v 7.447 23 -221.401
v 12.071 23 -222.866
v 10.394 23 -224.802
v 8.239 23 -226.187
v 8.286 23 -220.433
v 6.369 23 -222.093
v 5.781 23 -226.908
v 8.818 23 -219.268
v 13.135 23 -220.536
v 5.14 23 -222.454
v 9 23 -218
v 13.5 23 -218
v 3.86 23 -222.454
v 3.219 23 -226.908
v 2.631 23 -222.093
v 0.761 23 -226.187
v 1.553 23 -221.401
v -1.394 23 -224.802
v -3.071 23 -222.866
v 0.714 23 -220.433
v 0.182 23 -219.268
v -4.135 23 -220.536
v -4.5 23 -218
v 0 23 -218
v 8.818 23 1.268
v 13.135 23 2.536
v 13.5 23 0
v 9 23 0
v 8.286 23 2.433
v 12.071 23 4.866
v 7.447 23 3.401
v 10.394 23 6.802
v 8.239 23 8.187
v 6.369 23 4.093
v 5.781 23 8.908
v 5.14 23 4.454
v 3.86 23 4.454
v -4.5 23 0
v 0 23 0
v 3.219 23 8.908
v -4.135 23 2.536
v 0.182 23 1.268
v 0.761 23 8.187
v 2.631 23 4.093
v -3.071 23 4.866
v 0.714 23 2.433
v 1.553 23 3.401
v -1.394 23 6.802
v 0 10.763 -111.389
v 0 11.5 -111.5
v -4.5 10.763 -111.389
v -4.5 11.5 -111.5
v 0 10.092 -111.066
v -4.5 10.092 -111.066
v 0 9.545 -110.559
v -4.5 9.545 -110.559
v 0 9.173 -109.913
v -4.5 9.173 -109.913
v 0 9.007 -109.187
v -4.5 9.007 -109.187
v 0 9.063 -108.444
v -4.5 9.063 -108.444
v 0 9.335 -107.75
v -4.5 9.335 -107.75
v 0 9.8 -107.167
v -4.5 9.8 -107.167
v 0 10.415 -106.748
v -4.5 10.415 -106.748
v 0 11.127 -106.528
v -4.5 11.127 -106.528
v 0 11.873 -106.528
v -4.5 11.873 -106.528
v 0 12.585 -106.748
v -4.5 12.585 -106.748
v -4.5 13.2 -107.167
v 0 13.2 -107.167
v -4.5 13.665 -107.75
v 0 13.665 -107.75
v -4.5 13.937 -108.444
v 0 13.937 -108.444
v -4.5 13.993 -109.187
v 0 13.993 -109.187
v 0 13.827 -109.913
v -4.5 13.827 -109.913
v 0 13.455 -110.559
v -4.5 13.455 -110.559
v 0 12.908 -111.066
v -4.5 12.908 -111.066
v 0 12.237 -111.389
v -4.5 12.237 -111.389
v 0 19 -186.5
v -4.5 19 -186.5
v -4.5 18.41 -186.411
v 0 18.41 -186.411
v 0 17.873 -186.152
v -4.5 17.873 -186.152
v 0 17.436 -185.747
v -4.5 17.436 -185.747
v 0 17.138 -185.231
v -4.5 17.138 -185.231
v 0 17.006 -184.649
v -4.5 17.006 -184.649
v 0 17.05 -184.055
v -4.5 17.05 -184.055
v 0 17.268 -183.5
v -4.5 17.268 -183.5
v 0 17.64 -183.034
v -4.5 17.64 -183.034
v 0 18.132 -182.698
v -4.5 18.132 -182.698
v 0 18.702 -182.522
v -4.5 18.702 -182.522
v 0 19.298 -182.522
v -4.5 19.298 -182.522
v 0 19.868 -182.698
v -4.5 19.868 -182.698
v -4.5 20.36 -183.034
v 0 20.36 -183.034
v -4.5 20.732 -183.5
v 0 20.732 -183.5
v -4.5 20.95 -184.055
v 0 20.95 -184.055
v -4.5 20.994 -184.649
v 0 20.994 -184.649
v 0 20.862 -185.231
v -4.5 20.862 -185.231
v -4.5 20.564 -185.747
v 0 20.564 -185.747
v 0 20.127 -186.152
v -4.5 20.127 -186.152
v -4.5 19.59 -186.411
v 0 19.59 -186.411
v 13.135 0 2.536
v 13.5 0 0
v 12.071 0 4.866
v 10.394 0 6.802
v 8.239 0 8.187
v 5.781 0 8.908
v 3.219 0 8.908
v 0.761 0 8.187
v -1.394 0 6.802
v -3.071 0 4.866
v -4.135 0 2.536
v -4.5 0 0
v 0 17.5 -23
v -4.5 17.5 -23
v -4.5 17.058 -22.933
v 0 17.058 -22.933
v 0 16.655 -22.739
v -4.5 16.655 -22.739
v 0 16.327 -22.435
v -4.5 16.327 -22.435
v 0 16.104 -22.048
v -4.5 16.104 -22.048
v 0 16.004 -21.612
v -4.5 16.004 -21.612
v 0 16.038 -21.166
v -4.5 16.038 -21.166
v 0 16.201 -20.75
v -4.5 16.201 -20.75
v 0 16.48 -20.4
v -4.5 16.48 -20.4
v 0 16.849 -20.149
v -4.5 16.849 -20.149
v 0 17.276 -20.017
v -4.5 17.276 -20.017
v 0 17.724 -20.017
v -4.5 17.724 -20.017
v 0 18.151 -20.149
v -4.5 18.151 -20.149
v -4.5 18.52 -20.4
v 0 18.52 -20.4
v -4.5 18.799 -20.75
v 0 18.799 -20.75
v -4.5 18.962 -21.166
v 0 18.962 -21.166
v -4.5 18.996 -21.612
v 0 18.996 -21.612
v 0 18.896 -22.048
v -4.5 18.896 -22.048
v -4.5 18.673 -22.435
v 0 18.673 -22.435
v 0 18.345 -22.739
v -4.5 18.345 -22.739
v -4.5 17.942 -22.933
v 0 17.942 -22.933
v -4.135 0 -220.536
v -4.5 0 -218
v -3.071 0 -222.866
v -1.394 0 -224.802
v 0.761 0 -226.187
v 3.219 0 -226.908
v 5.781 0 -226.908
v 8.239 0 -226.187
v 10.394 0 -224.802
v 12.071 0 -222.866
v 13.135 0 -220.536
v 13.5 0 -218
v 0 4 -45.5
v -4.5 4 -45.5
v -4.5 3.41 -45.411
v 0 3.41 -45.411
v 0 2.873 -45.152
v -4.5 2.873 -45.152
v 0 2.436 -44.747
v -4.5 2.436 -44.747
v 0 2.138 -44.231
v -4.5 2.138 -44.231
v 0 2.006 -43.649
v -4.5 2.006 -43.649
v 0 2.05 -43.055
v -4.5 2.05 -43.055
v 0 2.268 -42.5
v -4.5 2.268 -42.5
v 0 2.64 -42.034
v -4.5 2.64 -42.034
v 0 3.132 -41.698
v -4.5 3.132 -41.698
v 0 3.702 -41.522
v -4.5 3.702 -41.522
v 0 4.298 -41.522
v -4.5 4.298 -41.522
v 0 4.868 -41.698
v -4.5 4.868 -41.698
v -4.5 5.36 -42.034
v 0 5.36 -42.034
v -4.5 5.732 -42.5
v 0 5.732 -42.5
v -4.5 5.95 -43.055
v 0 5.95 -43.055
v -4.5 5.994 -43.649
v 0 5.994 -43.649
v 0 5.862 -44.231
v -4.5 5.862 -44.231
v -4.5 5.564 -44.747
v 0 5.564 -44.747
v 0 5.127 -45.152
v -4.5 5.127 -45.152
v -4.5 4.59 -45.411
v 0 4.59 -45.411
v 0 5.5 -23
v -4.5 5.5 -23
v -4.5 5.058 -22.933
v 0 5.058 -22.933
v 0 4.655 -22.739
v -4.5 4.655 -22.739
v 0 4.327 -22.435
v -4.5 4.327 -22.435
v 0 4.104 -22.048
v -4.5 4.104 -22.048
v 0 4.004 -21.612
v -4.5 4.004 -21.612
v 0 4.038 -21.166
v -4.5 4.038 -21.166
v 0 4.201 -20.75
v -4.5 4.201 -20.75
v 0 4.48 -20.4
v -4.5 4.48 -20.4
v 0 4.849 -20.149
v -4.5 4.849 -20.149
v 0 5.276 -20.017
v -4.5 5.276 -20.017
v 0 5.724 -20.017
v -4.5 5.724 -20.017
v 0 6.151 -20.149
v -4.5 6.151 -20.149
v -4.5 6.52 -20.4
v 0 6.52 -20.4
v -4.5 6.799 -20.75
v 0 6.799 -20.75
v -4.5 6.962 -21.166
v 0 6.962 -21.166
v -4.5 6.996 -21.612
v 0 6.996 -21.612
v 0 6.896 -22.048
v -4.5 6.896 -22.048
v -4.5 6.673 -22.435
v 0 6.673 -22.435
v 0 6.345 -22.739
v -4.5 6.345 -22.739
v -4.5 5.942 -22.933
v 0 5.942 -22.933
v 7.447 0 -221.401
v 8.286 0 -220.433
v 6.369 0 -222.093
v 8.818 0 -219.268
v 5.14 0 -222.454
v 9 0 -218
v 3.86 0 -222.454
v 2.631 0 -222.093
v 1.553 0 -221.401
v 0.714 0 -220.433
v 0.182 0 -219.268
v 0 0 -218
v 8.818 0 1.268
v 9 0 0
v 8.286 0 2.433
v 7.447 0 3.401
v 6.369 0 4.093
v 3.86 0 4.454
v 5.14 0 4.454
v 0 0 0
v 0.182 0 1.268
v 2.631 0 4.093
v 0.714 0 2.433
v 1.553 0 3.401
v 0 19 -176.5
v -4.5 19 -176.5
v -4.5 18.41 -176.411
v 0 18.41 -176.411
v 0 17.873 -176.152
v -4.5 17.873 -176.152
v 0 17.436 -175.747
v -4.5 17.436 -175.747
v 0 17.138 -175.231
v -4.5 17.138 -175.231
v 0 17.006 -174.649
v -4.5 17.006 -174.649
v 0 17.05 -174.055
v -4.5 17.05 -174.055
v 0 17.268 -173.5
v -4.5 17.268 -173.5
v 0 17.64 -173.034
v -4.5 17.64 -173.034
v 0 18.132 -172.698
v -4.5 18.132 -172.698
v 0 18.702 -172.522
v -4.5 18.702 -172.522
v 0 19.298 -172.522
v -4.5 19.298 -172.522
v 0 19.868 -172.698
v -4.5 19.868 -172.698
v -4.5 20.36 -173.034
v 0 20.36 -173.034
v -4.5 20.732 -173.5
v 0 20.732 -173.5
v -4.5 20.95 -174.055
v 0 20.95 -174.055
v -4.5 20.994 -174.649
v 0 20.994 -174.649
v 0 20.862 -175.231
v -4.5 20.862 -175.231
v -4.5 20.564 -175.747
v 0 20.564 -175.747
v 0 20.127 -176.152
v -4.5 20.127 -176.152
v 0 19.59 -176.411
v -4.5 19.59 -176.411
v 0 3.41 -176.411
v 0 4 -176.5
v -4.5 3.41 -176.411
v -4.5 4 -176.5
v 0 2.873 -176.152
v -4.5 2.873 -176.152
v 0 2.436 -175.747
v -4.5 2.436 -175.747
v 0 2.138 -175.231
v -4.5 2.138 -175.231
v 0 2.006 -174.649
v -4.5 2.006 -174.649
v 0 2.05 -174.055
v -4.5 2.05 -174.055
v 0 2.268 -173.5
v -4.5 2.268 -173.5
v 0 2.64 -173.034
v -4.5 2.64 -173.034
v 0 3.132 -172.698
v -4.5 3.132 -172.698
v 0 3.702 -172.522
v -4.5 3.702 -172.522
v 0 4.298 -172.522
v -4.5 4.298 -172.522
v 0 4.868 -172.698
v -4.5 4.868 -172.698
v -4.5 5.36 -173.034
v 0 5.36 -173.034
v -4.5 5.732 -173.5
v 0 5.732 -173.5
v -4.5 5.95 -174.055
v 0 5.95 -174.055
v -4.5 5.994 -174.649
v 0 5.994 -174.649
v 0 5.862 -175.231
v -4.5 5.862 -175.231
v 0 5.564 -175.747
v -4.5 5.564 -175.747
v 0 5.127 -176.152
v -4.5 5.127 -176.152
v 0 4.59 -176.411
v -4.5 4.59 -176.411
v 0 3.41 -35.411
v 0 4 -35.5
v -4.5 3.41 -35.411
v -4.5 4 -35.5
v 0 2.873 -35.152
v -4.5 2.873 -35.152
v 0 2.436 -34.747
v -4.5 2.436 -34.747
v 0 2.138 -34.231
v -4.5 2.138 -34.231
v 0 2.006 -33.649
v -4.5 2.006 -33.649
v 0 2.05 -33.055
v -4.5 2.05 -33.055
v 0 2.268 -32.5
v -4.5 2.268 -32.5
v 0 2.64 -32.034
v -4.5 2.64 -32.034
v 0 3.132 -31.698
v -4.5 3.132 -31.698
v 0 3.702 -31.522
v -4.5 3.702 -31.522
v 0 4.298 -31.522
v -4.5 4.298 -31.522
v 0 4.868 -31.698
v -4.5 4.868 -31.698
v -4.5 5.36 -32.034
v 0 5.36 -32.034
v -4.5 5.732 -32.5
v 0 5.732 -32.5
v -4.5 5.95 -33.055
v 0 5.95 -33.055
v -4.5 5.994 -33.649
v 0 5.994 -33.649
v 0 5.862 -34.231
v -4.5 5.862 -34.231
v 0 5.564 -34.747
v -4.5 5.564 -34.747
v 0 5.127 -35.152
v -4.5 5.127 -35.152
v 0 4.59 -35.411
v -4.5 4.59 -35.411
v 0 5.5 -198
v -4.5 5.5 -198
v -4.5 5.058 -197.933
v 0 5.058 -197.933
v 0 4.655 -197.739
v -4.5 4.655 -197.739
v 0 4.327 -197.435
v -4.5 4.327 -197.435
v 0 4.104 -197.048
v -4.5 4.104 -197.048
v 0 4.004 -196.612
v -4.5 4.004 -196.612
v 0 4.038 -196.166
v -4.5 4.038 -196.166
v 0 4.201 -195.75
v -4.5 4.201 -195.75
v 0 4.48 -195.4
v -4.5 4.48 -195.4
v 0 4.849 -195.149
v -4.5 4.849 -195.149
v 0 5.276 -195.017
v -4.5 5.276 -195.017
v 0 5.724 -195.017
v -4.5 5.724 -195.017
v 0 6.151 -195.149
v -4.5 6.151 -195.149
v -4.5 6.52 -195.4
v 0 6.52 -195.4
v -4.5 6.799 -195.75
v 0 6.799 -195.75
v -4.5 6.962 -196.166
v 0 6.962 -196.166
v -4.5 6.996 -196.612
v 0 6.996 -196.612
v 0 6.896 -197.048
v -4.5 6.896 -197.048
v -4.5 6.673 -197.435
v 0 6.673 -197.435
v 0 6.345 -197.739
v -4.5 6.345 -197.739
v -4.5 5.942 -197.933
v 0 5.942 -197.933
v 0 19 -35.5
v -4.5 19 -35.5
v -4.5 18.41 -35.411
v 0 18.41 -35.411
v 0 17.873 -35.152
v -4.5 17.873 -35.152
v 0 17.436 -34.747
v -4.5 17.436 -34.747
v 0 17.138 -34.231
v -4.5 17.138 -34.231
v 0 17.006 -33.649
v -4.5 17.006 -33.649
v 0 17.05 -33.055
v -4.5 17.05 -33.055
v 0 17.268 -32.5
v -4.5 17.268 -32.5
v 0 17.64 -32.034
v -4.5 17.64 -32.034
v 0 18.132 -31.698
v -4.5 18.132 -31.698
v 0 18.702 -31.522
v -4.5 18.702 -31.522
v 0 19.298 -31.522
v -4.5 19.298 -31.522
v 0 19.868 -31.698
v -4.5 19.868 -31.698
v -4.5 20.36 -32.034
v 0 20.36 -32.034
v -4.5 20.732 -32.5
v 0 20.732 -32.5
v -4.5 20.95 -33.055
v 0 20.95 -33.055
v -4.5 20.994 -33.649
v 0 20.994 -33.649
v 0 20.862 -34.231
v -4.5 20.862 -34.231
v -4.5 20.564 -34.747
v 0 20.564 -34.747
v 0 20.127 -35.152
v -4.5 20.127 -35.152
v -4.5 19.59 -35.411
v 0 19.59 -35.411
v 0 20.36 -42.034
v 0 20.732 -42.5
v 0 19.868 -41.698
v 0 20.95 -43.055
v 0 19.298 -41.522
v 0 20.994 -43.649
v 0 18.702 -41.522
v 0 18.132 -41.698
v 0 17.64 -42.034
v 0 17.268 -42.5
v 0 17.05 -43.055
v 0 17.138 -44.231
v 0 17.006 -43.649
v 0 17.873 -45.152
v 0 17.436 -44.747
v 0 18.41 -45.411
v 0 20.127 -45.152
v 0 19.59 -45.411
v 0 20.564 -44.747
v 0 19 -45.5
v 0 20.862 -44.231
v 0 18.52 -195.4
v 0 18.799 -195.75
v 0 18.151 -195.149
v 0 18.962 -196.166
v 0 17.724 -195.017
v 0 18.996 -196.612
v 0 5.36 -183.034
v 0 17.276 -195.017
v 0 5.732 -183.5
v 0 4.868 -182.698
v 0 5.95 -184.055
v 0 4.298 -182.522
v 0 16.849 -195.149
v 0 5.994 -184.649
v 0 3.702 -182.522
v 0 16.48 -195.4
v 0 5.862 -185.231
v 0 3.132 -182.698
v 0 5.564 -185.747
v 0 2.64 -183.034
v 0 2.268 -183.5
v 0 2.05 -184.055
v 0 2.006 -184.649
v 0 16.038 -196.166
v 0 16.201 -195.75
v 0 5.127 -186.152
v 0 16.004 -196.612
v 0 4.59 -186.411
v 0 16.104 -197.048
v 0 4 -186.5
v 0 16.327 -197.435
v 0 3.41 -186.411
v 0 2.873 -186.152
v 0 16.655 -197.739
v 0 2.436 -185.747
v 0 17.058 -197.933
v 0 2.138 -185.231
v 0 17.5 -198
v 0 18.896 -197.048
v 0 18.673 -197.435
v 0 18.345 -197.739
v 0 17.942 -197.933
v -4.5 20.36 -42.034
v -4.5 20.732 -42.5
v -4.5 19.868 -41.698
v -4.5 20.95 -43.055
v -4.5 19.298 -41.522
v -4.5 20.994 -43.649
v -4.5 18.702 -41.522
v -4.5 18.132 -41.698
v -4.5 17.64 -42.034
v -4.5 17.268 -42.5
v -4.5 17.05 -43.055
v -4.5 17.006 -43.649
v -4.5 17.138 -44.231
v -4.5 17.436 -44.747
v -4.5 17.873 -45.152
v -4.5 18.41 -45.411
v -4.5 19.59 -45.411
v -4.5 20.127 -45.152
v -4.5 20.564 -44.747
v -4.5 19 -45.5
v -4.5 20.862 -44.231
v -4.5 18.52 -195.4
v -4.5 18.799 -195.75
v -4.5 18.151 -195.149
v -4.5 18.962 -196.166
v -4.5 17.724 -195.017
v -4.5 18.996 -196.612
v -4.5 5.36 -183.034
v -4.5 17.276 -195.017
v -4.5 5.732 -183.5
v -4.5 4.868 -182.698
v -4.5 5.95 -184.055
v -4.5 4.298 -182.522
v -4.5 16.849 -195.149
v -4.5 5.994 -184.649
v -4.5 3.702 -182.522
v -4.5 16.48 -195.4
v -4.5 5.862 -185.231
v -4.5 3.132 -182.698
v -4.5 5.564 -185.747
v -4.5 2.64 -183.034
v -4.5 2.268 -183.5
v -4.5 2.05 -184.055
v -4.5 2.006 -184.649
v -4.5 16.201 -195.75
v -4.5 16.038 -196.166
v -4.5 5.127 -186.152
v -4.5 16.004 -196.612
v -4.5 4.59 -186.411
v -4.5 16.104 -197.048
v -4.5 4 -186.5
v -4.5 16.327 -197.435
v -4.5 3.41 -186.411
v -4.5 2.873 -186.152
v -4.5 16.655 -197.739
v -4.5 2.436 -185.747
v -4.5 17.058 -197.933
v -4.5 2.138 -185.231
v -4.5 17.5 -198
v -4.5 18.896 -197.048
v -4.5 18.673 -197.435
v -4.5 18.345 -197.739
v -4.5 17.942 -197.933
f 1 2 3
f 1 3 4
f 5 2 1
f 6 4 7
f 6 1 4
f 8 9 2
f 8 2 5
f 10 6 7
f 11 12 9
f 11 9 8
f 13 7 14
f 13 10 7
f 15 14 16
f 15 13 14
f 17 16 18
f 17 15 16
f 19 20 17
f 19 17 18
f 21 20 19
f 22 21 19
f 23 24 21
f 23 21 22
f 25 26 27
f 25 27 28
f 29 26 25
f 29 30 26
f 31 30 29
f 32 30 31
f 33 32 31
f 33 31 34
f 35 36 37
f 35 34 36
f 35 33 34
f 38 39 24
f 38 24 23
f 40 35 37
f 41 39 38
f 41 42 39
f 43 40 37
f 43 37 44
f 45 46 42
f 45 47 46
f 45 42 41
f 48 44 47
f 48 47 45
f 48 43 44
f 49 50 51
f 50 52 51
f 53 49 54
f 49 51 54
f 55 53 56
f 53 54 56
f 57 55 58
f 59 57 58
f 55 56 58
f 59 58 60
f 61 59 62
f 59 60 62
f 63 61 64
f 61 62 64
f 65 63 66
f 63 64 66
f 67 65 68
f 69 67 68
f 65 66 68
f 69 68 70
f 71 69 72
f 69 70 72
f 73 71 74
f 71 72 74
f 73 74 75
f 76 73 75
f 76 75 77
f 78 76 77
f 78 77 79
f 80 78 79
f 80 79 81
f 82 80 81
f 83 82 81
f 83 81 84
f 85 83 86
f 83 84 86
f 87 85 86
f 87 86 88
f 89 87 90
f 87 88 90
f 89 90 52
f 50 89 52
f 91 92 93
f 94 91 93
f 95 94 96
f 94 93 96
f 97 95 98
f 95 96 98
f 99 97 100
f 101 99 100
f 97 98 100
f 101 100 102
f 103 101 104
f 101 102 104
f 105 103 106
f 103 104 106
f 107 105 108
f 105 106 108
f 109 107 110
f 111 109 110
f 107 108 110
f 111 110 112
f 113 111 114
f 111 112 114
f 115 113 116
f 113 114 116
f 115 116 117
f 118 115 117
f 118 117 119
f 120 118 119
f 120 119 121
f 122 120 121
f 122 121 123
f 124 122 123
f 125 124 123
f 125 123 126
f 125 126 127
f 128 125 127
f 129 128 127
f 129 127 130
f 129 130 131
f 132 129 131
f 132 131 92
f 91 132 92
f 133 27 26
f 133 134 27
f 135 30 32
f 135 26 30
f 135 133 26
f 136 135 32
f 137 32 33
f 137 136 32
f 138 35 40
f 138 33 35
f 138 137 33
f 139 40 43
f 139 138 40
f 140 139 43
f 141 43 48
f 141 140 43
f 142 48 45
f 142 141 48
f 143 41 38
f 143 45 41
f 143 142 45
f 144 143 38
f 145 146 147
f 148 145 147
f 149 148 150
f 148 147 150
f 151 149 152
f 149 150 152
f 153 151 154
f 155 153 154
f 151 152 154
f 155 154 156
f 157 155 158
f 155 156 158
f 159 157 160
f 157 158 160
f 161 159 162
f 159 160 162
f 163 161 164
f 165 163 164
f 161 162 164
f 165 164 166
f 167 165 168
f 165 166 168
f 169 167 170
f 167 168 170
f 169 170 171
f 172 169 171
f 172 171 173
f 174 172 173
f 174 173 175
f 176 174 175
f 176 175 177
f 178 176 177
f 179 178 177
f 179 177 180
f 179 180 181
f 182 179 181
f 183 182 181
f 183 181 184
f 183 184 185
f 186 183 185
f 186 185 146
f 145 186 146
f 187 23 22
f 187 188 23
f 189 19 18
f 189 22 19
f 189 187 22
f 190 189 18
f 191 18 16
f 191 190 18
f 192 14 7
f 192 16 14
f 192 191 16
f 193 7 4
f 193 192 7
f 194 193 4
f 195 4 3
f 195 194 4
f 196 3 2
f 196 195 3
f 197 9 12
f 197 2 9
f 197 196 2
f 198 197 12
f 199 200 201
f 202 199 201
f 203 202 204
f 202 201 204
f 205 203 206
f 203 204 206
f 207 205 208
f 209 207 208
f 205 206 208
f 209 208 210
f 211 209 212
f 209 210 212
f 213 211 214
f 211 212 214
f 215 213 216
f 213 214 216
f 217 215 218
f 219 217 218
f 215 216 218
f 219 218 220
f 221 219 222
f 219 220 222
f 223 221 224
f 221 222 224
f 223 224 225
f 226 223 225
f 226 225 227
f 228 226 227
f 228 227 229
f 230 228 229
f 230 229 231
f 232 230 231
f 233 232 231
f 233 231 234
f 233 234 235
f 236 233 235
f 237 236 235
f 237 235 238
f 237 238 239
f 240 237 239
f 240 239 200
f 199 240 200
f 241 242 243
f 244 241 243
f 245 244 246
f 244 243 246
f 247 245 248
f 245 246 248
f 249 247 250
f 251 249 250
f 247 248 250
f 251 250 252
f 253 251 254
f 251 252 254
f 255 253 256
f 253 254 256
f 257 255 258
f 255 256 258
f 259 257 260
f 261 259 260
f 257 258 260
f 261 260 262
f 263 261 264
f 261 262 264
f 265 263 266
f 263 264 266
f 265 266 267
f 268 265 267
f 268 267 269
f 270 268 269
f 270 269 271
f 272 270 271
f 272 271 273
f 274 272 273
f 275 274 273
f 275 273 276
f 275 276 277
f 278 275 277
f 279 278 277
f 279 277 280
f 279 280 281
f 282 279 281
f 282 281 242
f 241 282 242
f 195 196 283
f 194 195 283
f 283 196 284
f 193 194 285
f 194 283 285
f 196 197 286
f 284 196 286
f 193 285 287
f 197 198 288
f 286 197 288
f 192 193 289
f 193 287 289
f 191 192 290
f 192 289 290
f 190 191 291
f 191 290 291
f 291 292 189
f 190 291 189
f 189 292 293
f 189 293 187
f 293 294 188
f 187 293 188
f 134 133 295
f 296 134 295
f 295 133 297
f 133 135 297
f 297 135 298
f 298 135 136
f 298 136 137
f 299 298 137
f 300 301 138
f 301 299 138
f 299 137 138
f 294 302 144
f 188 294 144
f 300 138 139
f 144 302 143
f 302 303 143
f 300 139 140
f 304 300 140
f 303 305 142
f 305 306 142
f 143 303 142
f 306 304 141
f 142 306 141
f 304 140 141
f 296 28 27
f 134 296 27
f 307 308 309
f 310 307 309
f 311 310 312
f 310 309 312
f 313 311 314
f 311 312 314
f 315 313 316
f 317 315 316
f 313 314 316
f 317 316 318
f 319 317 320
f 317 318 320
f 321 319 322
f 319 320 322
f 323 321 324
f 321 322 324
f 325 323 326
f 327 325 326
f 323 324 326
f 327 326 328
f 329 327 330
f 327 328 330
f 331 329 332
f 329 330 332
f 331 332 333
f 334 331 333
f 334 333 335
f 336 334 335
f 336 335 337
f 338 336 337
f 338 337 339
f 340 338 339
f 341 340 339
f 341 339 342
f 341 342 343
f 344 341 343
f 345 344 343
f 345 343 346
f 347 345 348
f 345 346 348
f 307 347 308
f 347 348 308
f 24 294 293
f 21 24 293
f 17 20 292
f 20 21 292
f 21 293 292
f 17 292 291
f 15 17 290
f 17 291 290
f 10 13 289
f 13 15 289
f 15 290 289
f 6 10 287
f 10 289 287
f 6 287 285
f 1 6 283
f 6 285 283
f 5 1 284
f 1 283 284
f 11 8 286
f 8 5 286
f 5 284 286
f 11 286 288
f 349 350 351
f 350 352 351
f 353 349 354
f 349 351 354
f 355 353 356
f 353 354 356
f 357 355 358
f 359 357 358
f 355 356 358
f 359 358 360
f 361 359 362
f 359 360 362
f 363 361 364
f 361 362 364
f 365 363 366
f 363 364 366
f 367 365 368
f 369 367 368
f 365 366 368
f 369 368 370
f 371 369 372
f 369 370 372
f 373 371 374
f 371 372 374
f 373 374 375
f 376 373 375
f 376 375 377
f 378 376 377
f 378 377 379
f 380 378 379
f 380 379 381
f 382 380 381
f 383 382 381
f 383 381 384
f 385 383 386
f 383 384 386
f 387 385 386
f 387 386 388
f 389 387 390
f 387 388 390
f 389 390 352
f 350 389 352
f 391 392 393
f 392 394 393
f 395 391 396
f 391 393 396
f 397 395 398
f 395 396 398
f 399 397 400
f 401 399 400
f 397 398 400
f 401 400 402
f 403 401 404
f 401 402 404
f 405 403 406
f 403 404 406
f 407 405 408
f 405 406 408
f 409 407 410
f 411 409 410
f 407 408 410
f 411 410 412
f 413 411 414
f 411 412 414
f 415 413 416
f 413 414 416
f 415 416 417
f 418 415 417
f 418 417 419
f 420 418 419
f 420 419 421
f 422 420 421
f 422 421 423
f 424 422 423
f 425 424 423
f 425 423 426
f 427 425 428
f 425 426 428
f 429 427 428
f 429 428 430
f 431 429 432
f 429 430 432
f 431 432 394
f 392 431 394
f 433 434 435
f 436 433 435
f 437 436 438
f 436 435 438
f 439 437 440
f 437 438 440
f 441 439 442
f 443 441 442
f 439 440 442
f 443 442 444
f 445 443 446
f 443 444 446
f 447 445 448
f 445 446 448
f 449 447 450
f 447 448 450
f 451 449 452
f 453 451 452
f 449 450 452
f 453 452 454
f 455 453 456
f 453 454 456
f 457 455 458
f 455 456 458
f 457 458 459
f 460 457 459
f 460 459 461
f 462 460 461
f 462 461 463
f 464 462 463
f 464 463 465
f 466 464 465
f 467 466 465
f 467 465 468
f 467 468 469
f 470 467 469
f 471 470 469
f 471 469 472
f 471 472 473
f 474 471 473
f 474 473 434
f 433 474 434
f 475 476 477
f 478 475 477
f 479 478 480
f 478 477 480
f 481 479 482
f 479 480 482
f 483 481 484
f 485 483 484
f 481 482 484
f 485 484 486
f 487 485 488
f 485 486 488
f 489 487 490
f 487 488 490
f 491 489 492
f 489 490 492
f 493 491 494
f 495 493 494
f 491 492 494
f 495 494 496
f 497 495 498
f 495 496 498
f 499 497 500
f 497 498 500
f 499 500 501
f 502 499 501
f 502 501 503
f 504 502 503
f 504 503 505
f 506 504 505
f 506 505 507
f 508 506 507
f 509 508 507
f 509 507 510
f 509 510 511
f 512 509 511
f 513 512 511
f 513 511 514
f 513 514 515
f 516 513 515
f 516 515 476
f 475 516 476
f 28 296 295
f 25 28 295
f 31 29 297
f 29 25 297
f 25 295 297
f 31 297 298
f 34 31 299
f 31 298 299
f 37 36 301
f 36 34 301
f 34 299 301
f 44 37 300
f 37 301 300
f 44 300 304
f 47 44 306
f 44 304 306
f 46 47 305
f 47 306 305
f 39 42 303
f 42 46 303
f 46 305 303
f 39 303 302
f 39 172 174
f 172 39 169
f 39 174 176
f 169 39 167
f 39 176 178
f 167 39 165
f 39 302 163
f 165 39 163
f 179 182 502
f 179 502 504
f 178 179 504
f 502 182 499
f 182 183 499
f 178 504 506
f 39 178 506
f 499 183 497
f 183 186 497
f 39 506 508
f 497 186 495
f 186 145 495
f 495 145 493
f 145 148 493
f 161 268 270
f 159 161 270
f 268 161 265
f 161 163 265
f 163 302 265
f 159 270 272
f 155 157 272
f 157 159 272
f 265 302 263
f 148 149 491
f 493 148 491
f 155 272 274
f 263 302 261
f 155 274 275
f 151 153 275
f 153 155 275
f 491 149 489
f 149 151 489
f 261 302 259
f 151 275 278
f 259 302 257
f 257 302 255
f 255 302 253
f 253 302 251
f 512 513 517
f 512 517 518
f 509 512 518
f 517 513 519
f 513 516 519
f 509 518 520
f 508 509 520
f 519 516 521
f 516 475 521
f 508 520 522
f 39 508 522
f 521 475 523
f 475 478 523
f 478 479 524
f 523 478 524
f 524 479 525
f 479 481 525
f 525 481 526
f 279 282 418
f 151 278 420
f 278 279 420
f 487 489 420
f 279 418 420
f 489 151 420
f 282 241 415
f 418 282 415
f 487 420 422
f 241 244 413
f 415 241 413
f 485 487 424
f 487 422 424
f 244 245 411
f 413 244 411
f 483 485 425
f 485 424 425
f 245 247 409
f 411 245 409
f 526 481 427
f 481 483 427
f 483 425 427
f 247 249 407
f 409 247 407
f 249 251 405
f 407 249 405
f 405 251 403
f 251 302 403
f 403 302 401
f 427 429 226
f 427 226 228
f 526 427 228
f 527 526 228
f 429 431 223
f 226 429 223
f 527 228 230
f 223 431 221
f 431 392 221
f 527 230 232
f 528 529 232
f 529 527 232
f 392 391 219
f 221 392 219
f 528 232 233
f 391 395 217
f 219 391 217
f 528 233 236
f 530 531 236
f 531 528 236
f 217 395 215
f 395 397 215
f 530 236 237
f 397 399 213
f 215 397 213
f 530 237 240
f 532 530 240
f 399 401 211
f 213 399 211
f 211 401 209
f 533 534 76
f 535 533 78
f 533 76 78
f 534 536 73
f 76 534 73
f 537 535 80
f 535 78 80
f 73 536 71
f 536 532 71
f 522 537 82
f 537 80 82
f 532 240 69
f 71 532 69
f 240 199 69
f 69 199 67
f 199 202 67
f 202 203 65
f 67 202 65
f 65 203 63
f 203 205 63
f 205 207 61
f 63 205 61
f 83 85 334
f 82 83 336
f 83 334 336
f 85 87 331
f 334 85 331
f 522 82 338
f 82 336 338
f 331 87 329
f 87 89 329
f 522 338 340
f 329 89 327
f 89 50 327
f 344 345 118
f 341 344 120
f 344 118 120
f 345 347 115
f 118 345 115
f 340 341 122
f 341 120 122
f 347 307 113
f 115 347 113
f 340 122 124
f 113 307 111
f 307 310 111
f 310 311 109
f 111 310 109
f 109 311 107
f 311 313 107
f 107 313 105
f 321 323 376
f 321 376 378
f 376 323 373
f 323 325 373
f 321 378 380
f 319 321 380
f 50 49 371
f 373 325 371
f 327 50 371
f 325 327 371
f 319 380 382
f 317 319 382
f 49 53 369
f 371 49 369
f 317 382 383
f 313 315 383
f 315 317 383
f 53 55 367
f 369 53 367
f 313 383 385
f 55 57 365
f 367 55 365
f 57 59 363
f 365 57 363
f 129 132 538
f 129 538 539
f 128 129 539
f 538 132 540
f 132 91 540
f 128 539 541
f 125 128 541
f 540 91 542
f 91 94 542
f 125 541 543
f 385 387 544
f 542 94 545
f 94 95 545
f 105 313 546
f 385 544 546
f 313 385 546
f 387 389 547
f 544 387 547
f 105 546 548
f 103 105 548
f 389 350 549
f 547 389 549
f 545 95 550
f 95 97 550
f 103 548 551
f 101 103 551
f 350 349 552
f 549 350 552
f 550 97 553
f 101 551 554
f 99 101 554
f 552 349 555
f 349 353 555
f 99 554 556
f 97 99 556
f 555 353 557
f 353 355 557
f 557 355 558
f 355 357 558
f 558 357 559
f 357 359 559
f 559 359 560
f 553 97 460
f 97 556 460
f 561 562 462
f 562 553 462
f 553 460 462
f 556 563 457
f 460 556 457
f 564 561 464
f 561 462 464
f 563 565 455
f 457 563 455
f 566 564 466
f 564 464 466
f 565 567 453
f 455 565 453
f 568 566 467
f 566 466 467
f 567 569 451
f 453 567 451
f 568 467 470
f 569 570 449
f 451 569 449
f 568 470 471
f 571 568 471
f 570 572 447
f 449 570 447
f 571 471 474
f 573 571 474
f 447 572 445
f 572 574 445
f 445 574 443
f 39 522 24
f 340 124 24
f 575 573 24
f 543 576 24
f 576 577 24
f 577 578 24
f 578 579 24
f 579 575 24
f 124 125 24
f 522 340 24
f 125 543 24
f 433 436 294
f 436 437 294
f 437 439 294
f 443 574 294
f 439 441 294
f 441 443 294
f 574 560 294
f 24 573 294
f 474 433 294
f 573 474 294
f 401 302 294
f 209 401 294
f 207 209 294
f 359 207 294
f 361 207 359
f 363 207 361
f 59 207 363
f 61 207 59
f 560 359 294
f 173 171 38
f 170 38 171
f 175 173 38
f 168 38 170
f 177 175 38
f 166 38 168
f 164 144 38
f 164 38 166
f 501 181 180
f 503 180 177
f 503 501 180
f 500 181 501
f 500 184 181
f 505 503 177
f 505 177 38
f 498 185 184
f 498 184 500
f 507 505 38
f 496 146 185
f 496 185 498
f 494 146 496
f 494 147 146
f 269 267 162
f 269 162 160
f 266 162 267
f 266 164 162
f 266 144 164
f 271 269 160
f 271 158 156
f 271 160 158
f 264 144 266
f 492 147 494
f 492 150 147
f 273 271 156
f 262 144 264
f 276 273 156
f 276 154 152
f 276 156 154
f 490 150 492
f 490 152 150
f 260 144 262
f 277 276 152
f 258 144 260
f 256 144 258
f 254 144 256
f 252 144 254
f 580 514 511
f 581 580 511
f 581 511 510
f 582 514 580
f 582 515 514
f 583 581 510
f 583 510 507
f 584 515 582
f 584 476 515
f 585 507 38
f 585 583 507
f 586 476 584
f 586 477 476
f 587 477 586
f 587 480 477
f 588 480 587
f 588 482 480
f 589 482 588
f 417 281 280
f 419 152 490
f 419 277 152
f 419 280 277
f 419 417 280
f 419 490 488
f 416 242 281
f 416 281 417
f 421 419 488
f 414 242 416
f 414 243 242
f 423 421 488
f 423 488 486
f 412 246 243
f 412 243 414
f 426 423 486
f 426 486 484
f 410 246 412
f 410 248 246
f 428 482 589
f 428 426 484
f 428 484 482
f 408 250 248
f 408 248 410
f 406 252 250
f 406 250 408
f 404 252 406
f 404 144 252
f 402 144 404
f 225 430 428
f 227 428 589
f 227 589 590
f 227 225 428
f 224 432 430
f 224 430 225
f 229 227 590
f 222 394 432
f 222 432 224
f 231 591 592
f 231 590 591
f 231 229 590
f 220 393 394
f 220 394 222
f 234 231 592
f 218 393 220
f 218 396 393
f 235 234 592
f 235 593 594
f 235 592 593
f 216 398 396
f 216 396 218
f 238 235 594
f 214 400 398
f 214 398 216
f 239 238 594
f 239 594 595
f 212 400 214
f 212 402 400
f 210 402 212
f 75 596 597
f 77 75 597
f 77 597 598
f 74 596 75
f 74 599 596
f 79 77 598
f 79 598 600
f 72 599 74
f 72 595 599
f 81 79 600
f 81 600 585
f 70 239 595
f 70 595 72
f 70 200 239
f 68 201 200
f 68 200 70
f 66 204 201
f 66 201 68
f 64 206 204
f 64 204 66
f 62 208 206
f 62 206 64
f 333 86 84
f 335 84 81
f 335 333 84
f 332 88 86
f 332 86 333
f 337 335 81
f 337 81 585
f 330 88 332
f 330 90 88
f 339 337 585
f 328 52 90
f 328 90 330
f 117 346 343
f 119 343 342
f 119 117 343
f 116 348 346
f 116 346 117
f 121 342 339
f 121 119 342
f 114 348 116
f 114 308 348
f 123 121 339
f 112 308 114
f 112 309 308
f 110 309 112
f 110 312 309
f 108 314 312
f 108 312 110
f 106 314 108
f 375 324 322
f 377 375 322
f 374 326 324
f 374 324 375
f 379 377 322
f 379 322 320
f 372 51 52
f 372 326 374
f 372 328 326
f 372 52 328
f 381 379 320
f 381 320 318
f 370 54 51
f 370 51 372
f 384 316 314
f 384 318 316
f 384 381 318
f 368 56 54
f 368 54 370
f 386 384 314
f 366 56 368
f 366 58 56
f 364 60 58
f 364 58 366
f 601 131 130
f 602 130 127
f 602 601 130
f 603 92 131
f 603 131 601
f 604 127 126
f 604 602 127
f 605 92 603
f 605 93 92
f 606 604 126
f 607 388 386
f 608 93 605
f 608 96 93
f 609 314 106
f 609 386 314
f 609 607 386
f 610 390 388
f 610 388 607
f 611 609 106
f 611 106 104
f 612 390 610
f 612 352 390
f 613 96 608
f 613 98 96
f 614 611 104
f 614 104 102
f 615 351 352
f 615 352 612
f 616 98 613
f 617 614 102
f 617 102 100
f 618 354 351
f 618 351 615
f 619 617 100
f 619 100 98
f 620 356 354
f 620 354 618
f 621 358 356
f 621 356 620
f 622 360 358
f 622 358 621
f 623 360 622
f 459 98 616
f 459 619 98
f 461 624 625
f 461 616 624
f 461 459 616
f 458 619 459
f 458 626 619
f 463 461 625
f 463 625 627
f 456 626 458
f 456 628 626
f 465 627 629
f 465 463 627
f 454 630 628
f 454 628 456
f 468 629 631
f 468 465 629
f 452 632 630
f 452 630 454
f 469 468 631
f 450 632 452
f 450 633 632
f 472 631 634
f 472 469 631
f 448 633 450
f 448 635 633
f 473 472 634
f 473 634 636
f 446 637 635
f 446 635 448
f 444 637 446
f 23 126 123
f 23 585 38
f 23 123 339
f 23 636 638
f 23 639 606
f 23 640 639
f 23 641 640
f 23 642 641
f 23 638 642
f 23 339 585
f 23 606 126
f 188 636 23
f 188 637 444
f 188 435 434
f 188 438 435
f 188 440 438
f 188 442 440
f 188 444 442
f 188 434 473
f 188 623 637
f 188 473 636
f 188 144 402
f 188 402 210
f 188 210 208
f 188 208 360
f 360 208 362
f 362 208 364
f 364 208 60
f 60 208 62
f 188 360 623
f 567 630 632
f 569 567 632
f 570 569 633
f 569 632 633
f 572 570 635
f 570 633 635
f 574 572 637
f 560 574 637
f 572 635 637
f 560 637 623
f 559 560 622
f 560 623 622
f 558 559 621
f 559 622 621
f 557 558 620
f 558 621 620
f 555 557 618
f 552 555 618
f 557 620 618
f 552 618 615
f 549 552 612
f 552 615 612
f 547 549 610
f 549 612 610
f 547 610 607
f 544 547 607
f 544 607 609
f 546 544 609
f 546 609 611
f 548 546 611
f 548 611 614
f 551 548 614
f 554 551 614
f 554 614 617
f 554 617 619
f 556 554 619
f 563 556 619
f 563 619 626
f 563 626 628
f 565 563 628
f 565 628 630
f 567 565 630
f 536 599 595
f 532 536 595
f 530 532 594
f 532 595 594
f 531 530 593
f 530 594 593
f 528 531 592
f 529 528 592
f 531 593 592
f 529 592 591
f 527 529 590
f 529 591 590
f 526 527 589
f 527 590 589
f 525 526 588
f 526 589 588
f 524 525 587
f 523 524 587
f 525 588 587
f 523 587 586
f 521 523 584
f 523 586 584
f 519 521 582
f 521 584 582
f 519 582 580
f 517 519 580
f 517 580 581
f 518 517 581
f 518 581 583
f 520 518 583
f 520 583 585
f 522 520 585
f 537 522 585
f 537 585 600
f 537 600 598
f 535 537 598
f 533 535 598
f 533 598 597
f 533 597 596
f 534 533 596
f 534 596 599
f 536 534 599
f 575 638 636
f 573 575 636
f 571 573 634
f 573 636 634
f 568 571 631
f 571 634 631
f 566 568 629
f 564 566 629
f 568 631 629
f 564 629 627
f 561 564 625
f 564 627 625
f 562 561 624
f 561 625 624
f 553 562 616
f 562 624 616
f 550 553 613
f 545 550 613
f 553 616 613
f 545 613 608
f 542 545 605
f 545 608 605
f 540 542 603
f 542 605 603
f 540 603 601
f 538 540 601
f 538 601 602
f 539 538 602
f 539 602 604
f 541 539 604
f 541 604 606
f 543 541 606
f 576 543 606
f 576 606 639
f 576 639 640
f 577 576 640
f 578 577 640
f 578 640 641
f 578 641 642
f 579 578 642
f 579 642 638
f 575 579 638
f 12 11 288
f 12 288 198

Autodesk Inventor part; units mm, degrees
ref_plane "YZ Plane" through (0, 0, 0) normal (1, 0, 0) x (0, 1, 0)
ref_plane "XZ Plane" through (0, 0, 0) normal (0, 1, 0) x (-1, 0, 0)
ref_plane "XY Plane" through (0, 0, 0) normal (0, 0, 1) x (1, 0, 0)
sketch "Sketch1" plane through (0, 0, 0) normal (0, 1, 0) x (-1, 0, 0)
  line L0 (0, 0) -> (0, -218)
  arc A0 (0, 0) -> (-9, 0) centre (-4.5, 0) ccw
  line L1 (-9, 0) -> (-13.5, 0)
  line L2 (4.5, 0) -> (4.5, -218)
  arc A1 (4.5, 0) -> (-13.5, 0) centre (-4.5, 0) ccw
  line L3 (0, 0) -> (-17, 0) construction
  line L4 (52, -109) -> (-119, -109) construction
  line L5 (0, -218) -> (0, 0)
  arc A2 (-9, -218) -> (0, -218) centre (-4.5, -218) ccw
  line L6 (-9, -218) -> (-13.5, -218)
  line L7 (4.5, -218) -> (4.5, 0)
  arc A3 (-13.5, -218) -> (4.5, -218) centre (-4.5, -218) ccw
  point P0 (4.5, -109)
  dimension "d0" = 218
  dimension "d1" = 9
  dimension "d2" = 4.5
  dimension "d3" = 218
  dimension "d4" = 4.5
  dimension "d5" = 9
  dimension "d6" = 4.5
  dimension "d7" = 18
extrude "Extrusion1" add sketch "Sketch1" along normal blind 23
sketch "Sketch2" plane through (0, 0, 0) normal (1, 0, 0) x (0, 0, -1)
  circle A0 centre (109, 11.5) radius 2.5
  line L0 (0, 23) -> (218, 23) projected
  line L1 (0, 0) -> (0, 23) projected
  line L2 (33.5, 4) -> (43.5, 4) construction
  line L3 (43.5, 4) -> (43.5, 19) construction
  line L4 (43.5, 19) -> (33.5, 19) construction
  line L5 (33.5, 19) -> (33.5, 4) construction
  line L6 (33.5, 4) -> (43.5, 19) construction
  line L7 (43.5, 4) -> (33.5, 19) construction
  circle A1 centre (43.5, 19) radius 2
  circle A2 centre (33.5, 19) radius 2
  circle A3 centre (33.5, 4) radius 2
  circle A4 centre (43.5, 4) radius 2
  line L8 (0, 0) -> (218, 0) projected
  line L9 (21.5, 5.5) -> (21.5, 17.5) construction
  circle A5 centre (21.5, 17.5) radius 1.5
  circle A6 centre (21.5, 5.5) radius 1.5
  line L10 (109, 37.5143) -> (109, -14.5143) construction
  line L11 (184.5, 4) -> (174.5, 4) construction
  line L12 (174.5, 4) -> (174.5, 19) construction
  line L13 (174.5, 19) -> (184.5, 19) construction
  line L14 (184.5, 19) -> (184.5, 4) construction
  line L15 (184.5, 4) -> (174.5, 19) construction
  line L16 (174.5, 4) -> (184.5, 19) construction
  circle A7 centre (174.5, 19) radius 2
  circle A8 centre (184.5, 19) radius 2
  circle A9 centre (184.5, 4) radius 2
  circle A10 centre (174.5, 4) radius 2
  line L17 (196.5, 5.5) -> (196.5, 17.5) construction
  circle A11 centre (196.5, 17.5) radius 1.5
  circle A12 centre (196.5, 5.5) radius 1.5
  point P0 (38.5, 11.5)
  point P1 (179.5, 11.5)
  dimension "d10" = 5
  dimension "d11" = 11.5
  dimension "d12" = 109
  dimension "d13" = 4
  dimension "d14" = 4
  dimension "d15" = 4
  dimension "d16" = 4
  dimension "d17" = 4
  dimension "d18" = 4
  dimension "d19" = 65.5
  dimension "d20" = 10
  dimension "d21" = 3
  dimension "d22" = 3
  dimension "d23" = 5.5
  dimension "d24" = 5.5
  dimension "d25" = 12
hole "Hole1" at (0, 17.5, -21.5) at (0, 5.5, -21.5) at (0, 17.5, -196.5) at (0, 5.5, -196.5) direction (-1, 0, 0) diameter 3 end through all
hole "Hole2" at (0, 19, -184.5) at (0, 19, -174.5) at (0, 4, -184.5) at (0, 4, -174.5) at (0, 19, -33.5) at (0, 19, -43.5) at (0, 4, -33.5) at (0, 4, -43.5) direction (-1, 0, 0) diameter 4 end through all
hole "Hole3" at (0, 11.5, -109) direction (-1, 0, 0) diameter 5 end through all
properties part number "HUDSON-1-07 FRONT BUFFERR BEAM"
